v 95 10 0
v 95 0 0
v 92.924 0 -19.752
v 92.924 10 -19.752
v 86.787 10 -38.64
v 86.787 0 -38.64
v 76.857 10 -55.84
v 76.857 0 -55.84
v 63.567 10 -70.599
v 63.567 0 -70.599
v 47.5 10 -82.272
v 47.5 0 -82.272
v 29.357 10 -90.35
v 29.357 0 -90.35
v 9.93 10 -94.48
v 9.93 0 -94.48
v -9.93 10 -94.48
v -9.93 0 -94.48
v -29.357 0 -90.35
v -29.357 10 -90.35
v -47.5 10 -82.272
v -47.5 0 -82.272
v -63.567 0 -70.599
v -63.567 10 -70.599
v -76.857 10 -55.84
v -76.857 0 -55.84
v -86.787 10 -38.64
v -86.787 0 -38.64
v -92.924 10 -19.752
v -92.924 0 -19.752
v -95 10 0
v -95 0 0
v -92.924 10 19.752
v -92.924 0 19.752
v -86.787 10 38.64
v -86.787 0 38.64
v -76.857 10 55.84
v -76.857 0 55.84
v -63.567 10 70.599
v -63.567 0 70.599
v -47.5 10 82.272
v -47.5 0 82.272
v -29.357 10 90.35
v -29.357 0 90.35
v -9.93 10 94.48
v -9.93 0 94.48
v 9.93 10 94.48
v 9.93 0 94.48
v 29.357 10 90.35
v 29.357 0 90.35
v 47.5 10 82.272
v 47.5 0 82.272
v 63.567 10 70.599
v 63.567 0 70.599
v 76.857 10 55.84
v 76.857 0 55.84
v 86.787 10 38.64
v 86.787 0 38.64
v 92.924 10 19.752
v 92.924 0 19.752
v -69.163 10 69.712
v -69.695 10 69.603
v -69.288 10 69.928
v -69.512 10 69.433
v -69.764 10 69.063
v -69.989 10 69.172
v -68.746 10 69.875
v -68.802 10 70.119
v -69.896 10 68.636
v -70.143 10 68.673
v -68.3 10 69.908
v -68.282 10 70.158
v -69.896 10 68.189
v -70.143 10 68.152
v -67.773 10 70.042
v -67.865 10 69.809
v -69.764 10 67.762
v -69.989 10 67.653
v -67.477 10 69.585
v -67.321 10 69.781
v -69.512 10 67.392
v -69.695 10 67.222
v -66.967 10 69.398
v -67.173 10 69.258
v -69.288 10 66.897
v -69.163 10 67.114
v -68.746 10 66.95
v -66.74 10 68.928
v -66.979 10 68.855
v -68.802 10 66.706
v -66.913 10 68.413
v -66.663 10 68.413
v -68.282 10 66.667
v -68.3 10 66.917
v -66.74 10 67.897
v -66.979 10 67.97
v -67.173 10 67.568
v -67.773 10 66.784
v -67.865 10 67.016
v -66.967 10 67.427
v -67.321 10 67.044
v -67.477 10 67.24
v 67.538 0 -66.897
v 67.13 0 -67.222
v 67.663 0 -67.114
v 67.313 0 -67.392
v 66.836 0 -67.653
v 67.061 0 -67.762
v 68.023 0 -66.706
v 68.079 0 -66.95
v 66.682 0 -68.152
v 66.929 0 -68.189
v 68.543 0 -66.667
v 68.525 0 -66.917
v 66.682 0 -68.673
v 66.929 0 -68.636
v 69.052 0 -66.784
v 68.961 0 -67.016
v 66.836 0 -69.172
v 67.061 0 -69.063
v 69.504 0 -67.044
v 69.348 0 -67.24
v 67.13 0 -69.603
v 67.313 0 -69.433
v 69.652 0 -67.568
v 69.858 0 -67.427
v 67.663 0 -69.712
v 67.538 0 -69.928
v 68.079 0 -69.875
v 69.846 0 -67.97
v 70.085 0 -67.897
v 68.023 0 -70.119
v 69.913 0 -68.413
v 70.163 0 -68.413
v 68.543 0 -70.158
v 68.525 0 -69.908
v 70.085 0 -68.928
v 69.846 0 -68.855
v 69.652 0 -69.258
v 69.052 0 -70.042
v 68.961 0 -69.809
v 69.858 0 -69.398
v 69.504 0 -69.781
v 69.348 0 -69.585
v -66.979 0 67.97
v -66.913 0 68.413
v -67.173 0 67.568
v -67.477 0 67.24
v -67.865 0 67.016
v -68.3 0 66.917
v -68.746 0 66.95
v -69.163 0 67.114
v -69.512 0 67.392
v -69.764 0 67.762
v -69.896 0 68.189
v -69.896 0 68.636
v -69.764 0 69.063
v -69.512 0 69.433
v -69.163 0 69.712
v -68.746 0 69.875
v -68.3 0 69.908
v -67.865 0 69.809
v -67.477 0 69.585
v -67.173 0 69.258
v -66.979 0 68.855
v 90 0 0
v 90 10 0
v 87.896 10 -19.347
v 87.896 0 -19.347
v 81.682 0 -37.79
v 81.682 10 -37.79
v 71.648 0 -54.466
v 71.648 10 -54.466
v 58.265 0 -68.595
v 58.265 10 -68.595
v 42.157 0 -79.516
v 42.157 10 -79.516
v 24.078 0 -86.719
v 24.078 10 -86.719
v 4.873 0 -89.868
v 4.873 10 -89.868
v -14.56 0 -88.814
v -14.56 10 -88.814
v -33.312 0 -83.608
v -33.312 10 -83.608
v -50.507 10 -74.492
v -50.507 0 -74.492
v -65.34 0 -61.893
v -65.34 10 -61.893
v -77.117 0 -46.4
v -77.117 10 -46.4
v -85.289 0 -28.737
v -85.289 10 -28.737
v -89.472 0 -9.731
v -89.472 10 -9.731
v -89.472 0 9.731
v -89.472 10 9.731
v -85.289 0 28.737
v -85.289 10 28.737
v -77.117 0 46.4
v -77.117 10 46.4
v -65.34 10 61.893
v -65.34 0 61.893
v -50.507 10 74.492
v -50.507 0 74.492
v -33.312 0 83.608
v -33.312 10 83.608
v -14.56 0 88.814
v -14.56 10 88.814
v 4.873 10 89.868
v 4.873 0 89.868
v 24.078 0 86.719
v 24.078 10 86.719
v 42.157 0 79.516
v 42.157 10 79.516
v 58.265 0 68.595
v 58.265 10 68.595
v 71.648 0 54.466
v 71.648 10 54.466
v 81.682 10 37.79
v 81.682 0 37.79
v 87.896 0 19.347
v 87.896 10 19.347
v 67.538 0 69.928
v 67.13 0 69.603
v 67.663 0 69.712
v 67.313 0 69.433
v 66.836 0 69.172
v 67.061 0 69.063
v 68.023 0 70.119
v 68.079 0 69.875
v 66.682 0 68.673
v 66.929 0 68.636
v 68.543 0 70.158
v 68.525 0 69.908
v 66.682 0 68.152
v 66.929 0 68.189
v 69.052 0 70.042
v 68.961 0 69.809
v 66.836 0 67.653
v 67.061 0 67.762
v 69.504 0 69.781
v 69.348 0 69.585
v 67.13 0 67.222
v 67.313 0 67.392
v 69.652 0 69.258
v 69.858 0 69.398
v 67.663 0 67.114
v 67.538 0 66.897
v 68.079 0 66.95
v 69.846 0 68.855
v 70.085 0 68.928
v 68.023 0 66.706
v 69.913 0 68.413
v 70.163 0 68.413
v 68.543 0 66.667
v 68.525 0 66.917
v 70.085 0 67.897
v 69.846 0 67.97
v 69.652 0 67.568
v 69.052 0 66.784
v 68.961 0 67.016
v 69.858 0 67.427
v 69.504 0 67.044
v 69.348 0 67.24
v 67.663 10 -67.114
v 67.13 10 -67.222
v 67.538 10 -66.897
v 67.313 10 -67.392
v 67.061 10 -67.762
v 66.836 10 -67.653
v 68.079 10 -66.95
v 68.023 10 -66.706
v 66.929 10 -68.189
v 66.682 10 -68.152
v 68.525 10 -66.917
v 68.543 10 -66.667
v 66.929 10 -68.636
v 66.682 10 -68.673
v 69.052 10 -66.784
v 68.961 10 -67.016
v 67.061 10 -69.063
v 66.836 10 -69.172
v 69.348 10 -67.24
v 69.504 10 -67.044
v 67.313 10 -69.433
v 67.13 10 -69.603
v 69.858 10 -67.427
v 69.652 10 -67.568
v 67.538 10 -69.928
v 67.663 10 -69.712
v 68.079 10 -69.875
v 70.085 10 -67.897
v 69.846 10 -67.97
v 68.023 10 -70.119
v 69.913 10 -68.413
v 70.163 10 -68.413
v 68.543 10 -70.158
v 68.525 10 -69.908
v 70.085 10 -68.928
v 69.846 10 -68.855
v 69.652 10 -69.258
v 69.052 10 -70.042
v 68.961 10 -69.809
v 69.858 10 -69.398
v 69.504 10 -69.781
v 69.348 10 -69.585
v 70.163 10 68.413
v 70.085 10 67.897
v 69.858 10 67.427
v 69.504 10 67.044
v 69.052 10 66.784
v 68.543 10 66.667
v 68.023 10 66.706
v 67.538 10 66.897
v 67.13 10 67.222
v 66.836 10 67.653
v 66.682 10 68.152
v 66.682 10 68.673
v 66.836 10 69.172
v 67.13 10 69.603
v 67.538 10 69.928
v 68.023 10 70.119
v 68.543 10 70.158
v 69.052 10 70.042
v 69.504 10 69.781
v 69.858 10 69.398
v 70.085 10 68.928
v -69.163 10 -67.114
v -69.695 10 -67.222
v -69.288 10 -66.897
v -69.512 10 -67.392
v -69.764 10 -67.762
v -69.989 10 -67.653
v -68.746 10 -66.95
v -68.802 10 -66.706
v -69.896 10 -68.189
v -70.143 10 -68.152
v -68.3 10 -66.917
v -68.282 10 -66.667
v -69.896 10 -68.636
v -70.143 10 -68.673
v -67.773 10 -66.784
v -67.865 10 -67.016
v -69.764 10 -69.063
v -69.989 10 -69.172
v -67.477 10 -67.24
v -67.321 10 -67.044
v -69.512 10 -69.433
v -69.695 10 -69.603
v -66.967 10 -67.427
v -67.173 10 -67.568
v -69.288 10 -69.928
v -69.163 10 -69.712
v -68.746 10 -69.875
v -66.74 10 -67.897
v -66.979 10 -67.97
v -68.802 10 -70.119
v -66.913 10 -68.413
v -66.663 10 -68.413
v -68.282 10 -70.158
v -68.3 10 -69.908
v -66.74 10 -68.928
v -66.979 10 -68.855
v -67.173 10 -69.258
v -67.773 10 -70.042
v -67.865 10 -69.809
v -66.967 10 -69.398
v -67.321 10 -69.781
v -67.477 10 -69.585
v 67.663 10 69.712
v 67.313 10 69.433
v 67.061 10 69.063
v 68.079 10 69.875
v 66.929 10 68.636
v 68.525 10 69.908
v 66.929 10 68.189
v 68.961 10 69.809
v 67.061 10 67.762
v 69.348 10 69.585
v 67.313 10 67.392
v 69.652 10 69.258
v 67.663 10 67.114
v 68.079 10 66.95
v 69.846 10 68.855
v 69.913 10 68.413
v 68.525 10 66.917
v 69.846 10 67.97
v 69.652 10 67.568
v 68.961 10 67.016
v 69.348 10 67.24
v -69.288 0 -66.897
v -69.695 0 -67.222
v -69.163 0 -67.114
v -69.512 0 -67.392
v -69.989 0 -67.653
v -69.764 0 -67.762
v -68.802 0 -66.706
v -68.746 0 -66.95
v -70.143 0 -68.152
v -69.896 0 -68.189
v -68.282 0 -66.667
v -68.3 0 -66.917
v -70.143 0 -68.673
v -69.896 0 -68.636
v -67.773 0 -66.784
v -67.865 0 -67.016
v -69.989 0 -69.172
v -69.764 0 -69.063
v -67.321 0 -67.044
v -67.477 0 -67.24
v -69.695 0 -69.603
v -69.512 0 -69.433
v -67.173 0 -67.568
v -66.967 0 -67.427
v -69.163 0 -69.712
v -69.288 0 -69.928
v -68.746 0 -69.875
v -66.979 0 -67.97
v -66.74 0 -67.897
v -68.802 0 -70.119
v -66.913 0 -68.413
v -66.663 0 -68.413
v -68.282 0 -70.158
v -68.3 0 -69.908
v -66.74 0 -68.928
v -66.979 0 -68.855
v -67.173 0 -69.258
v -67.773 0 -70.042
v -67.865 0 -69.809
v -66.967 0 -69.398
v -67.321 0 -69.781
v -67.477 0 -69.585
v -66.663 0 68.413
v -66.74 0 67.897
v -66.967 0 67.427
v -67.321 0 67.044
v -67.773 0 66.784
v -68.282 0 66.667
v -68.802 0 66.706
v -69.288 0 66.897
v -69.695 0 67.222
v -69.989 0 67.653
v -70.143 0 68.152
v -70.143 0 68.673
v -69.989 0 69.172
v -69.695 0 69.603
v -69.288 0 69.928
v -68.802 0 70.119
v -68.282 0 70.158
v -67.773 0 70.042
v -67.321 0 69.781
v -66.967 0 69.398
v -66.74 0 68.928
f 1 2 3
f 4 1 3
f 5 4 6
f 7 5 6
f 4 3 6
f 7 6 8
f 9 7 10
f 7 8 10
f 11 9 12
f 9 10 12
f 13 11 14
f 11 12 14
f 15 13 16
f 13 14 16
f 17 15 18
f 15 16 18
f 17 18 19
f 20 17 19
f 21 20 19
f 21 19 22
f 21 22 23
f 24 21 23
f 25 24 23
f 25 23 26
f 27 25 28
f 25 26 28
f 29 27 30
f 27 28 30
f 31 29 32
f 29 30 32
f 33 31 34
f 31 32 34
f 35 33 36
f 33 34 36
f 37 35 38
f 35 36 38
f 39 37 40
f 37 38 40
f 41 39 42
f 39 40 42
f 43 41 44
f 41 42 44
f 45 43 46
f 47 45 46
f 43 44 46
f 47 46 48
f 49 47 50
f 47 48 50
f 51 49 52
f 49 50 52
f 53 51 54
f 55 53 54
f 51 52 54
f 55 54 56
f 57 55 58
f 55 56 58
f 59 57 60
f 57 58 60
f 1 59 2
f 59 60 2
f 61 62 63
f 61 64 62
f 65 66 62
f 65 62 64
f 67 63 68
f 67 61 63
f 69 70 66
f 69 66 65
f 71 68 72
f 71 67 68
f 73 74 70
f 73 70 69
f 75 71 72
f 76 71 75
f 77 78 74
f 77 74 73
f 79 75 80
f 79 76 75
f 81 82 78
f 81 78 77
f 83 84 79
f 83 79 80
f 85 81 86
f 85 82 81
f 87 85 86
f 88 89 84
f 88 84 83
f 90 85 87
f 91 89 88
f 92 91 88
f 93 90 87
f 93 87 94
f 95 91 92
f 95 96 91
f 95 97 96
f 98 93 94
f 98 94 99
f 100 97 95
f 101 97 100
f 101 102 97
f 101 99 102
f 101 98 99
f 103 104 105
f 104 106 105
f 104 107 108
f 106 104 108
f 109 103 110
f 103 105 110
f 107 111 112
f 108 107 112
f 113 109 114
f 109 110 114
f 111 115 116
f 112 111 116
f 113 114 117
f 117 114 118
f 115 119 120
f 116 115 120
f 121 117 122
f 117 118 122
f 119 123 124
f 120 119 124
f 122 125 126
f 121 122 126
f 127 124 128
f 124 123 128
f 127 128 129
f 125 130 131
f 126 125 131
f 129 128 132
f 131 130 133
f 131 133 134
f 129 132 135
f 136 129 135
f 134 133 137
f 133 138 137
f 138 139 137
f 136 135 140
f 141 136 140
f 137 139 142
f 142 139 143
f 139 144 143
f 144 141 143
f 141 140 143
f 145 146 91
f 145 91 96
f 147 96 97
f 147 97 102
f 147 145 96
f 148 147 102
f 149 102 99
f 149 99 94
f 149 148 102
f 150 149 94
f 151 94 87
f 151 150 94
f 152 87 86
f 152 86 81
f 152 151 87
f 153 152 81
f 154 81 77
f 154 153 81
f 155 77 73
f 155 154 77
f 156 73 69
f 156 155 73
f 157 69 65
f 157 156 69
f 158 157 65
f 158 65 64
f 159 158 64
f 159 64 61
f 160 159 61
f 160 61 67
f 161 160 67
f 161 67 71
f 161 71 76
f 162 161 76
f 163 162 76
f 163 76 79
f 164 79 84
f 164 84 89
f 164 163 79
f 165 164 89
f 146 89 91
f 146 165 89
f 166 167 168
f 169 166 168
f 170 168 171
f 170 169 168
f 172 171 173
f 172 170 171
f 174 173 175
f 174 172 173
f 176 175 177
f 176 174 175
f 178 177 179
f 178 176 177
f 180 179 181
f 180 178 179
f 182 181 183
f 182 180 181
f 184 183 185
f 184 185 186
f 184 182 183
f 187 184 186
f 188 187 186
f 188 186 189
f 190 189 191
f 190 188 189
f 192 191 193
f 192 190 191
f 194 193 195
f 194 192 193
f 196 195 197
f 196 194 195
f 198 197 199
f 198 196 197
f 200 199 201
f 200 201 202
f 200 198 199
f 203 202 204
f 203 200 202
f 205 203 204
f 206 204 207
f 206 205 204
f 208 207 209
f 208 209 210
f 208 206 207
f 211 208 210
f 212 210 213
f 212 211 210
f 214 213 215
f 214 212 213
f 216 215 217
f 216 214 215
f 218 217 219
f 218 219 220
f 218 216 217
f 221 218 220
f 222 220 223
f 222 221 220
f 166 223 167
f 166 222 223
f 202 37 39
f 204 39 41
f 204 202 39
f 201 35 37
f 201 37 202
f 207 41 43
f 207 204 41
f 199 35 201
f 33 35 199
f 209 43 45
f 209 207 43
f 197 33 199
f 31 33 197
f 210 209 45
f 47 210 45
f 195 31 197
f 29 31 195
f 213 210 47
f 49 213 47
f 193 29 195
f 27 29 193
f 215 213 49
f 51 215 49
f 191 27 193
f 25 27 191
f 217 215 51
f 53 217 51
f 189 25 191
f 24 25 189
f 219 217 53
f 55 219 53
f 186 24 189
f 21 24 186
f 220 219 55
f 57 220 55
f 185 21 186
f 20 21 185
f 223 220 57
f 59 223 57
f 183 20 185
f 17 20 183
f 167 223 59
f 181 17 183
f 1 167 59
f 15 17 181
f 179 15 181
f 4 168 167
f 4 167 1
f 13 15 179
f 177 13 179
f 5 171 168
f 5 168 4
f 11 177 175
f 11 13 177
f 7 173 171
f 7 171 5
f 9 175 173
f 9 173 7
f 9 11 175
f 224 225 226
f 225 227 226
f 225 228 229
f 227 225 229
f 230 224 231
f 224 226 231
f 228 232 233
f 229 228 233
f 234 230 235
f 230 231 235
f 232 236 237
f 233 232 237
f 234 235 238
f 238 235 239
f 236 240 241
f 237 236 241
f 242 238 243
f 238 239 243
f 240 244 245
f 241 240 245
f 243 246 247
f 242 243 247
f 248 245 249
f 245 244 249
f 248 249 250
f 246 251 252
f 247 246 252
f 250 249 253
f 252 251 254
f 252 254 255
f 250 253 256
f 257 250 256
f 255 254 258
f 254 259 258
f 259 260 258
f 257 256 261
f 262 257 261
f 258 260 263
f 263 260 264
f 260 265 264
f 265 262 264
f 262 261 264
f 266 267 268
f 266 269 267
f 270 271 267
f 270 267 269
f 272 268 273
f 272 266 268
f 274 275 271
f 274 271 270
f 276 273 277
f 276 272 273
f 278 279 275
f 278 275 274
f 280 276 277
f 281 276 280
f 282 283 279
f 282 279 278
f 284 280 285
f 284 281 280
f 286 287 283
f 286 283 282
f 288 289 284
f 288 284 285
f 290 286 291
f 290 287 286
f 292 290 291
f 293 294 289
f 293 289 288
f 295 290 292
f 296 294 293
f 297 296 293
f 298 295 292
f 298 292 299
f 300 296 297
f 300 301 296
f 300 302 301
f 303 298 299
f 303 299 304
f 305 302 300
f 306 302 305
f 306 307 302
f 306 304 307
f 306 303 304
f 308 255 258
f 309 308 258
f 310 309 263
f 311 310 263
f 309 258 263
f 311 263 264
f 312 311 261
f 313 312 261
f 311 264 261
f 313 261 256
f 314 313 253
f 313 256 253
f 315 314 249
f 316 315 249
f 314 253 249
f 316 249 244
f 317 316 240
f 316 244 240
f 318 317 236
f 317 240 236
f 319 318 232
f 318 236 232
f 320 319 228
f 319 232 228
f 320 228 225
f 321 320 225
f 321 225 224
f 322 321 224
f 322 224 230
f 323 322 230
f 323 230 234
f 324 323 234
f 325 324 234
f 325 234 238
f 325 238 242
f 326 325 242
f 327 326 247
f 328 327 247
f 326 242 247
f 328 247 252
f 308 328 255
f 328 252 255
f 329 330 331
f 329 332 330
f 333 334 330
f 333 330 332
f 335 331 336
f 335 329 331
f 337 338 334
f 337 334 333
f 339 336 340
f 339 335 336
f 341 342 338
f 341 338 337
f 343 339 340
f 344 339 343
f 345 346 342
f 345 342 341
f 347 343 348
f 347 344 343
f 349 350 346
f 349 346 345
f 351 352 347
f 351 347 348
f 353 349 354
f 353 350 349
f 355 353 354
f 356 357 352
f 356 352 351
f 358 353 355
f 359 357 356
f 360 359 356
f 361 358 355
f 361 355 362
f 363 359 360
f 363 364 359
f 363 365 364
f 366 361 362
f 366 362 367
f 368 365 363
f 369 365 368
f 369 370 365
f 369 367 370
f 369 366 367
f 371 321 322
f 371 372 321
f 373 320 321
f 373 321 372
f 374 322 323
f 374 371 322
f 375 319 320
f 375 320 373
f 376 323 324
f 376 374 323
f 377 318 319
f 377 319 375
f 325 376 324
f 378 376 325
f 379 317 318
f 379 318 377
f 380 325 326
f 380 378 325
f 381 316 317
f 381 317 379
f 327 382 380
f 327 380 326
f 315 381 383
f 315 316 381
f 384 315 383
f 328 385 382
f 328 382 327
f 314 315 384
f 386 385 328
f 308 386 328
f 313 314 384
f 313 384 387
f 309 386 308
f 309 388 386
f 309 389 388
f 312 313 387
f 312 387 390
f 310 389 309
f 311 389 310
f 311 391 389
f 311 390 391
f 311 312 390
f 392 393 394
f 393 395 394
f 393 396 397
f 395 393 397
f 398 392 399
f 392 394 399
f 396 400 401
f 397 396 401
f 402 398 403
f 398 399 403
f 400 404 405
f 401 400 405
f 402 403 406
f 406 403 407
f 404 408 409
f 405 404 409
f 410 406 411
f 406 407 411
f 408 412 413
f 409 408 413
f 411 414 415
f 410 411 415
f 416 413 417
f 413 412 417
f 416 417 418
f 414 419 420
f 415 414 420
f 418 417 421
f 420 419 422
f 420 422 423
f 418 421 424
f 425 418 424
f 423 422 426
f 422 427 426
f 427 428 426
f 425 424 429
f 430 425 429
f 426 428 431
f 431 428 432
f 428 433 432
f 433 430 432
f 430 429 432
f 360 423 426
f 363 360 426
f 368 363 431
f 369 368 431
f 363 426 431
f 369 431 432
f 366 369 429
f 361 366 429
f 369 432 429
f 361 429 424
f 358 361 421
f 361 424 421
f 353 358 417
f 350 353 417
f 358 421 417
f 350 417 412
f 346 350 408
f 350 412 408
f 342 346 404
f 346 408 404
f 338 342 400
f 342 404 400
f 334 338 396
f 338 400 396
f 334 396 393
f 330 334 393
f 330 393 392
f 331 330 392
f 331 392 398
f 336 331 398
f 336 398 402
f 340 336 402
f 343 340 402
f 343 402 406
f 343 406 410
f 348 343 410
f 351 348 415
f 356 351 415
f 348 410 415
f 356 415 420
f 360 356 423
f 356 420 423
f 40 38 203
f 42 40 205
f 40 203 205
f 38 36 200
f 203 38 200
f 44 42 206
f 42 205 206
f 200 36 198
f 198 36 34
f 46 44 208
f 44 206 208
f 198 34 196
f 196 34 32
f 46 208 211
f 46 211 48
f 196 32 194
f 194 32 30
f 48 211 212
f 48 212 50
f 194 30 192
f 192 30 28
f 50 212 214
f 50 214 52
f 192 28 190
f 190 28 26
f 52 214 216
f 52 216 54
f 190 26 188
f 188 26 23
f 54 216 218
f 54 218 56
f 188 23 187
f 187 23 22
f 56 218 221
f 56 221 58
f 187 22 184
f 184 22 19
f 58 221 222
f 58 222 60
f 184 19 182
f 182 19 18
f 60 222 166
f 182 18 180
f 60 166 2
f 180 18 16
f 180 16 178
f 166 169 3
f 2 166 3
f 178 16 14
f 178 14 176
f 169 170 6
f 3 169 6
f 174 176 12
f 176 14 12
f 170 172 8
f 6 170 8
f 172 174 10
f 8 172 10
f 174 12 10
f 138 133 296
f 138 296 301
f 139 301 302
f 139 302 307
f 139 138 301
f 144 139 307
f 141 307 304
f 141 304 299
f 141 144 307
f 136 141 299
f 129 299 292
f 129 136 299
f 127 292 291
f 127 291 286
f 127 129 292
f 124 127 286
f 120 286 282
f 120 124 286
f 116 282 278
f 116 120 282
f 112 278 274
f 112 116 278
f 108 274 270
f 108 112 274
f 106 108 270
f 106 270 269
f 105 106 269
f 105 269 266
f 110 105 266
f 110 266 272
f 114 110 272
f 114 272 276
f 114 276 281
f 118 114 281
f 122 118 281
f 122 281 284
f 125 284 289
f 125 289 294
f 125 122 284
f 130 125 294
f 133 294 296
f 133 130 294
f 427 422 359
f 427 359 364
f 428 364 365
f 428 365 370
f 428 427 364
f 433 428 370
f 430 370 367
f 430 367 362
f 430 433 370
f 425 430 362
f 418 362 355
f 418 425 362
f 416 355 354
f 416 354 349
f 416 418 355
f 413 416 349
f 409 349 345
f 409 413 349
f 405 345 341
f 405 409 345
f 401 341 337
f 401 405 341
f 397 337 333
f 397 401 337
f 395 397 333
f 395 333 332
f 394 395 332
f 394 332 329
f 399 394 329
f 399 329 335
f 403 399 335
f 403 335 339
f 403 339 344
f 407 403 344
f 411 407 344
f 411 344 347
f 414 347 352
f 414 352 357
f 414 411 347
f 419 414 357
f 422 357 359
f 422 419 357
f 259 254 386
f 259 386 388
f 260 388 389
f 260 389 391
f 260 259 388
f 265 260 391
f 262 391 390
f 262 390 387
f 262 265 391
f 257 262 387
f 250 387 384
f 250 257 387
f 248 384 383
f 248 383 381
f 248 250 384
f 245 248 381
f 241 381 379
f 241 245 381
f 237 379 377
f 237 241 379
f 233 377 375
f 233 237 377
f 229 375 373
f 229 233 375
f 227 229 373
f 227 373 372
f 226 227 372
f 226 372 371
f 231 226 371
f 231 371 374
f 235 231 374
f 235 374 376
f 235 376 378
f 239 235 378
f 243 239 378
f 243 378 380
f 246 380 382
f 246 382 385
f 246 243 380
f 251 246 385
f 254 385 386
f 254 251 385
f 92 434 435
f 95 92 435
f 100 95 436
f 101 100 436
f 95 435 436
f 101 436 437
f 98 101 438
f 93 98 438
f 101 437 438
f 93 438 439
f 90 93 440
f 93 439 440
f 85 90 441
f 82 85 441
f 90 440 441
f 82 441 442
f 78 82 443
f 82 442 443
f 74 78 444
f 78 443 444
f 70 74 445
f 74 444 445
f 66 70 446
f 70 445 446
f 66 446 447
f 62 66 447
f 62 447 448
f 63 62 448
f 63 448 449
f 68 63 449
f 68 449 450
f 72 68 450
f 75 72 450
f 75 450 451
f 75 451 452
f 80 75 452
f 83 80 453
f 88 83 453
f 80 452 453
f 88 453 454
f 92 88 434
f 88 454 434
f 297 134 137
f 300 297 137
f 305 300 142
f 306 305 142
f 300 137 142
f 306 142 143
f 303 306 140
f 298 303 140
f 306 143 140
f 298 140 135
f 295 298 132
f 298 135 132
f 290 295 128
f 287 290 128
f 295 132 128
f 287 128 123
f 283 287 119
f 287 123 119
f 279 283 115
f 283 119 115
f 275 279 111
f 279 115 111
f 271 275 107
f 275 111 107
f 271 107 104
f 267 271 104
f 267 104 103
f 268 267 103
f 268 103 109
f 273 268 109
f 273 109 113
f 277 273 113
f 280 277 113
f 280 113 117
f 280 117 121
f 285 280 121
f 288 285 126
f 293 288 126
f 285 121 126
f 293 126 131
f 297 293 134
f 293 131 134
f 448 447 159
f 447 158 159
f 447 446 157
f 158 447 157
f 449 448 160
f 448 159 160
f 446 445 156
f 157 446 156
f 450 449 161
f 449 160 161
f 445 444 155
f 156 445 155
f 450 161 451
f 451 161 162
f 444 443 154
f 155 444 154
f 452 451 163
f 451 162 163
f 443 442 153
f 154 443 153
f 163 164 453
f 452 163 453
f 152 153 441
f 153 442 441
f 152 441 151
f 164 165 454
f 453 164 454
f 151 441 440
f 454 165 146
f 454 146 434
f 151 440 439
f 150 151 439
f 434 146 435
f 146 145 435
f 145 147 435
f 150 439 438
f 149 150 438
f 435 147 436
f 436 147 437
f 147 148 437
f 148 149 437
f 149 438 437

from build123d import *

# Parameters (mm, degrees)
SKETCH_1_R        = 95
SKETCH_1_R_2      = 90
EXTRUDE_2_DEPTH   = 10
SKETCH_1_R_3      = 1.75
SKETCH_1_R_4      = 1.5
EXTRUDE_2_2_DEPTH = 10
EXTRUDE_2_3_DEPTH = 10
EXTRUDE_2_4_DEPTH = 10
EXTRUDE_2_5_DEPTH = 10


with BuildPart() as part:
    # Эскиз1 → Бобышка-Вытянуть2 (new body)
    with BuildSketch(Plane(origin=(0, 0, 0), x_dir=(1, 0, 0), z_dir=(0, 1, 0))):
        Circle(SKETCH_1_R)
        Circle(SKETCH_1_R_2, mode=Mode.SUBTRACT)
    extrude(amount=EXTRUDE_2_DEPTH)


with BuildPart() as body_2:
    # Эскиз1 → Extrude 2 2 (new body)
    with BuildSketch(Plane(origin=(0, 0, 0), x_dir=(1, 0, 0), z_dir=(0, 1, 0))):
        with Locations((68.41258108, 68.41258108)):
            Circle(SKETCH_1_R_3)
        with Locations((68.41258108, 68.41258108)):
            Circle(SKETCH_1_R_4, mode=Mode.SUBTRACT)
    extrude(amount=EXTRUDE_2_2_DEPTH)


with BuildPart() as body_3:
    # Эскиз1 → Extrude 2 3 (new body)
    with BuildSketch(Plane(origin=(0, 0, 0), x_dir=(1, 0, 0), z_dir=(0, 1, 0))):
        with Locations((68.41258108, -68.41258108)):
            Circle(SKETCH_1_R_3)
        with Locations((68.41258108, -68.41258108)):
            Circle(SKETCH_1_R_4, mode=Mode.SUBTRACT)
    extrude(amount=EXTRUDE_2_3_DEPTH)


with BuildPart() as body_4:
    # Эскиз1 → Extrude 2 4 (new body)
    with BuildSketch(Plane(origin=(0, 0, 0), x_dir=(1, 0, 0), z_dir=(0, 1, 0))):
        with Locations((-68.41258108, -68.41258108)):
            Circle(SKETCH_1_R_3)
        with Locations((-68.41258108, -68.41258108)):
            Circle(SKETCH_1_R_4, mode=Mode.SUBTRACT)
    extrude(amount=EXTRUDE_2_4_DEPTH)


with BuildPart() as body_5:
    # Эскиз1 → Extrude 2 5 (new body)
    with BuildSketch(Plane(origin=(0, 0, 0), x_dir=(1, 0, 0), z_dir=(0, 1, 0))):
        with Locations((-68.41258108, 68.41258108)):
            Circle(SKETCH_1_R_3)
        with Locations((-68.41258108, 68.41258108)):
            Circle(SKETCH_1_R_4, mode=Mode.SUBTRACT)
    extrude(amount=EXTRUDE_2_5_DEPTH)


solid = Compound([part.part, body_2.part, body_3.part, body_4.part, body_5.part])
